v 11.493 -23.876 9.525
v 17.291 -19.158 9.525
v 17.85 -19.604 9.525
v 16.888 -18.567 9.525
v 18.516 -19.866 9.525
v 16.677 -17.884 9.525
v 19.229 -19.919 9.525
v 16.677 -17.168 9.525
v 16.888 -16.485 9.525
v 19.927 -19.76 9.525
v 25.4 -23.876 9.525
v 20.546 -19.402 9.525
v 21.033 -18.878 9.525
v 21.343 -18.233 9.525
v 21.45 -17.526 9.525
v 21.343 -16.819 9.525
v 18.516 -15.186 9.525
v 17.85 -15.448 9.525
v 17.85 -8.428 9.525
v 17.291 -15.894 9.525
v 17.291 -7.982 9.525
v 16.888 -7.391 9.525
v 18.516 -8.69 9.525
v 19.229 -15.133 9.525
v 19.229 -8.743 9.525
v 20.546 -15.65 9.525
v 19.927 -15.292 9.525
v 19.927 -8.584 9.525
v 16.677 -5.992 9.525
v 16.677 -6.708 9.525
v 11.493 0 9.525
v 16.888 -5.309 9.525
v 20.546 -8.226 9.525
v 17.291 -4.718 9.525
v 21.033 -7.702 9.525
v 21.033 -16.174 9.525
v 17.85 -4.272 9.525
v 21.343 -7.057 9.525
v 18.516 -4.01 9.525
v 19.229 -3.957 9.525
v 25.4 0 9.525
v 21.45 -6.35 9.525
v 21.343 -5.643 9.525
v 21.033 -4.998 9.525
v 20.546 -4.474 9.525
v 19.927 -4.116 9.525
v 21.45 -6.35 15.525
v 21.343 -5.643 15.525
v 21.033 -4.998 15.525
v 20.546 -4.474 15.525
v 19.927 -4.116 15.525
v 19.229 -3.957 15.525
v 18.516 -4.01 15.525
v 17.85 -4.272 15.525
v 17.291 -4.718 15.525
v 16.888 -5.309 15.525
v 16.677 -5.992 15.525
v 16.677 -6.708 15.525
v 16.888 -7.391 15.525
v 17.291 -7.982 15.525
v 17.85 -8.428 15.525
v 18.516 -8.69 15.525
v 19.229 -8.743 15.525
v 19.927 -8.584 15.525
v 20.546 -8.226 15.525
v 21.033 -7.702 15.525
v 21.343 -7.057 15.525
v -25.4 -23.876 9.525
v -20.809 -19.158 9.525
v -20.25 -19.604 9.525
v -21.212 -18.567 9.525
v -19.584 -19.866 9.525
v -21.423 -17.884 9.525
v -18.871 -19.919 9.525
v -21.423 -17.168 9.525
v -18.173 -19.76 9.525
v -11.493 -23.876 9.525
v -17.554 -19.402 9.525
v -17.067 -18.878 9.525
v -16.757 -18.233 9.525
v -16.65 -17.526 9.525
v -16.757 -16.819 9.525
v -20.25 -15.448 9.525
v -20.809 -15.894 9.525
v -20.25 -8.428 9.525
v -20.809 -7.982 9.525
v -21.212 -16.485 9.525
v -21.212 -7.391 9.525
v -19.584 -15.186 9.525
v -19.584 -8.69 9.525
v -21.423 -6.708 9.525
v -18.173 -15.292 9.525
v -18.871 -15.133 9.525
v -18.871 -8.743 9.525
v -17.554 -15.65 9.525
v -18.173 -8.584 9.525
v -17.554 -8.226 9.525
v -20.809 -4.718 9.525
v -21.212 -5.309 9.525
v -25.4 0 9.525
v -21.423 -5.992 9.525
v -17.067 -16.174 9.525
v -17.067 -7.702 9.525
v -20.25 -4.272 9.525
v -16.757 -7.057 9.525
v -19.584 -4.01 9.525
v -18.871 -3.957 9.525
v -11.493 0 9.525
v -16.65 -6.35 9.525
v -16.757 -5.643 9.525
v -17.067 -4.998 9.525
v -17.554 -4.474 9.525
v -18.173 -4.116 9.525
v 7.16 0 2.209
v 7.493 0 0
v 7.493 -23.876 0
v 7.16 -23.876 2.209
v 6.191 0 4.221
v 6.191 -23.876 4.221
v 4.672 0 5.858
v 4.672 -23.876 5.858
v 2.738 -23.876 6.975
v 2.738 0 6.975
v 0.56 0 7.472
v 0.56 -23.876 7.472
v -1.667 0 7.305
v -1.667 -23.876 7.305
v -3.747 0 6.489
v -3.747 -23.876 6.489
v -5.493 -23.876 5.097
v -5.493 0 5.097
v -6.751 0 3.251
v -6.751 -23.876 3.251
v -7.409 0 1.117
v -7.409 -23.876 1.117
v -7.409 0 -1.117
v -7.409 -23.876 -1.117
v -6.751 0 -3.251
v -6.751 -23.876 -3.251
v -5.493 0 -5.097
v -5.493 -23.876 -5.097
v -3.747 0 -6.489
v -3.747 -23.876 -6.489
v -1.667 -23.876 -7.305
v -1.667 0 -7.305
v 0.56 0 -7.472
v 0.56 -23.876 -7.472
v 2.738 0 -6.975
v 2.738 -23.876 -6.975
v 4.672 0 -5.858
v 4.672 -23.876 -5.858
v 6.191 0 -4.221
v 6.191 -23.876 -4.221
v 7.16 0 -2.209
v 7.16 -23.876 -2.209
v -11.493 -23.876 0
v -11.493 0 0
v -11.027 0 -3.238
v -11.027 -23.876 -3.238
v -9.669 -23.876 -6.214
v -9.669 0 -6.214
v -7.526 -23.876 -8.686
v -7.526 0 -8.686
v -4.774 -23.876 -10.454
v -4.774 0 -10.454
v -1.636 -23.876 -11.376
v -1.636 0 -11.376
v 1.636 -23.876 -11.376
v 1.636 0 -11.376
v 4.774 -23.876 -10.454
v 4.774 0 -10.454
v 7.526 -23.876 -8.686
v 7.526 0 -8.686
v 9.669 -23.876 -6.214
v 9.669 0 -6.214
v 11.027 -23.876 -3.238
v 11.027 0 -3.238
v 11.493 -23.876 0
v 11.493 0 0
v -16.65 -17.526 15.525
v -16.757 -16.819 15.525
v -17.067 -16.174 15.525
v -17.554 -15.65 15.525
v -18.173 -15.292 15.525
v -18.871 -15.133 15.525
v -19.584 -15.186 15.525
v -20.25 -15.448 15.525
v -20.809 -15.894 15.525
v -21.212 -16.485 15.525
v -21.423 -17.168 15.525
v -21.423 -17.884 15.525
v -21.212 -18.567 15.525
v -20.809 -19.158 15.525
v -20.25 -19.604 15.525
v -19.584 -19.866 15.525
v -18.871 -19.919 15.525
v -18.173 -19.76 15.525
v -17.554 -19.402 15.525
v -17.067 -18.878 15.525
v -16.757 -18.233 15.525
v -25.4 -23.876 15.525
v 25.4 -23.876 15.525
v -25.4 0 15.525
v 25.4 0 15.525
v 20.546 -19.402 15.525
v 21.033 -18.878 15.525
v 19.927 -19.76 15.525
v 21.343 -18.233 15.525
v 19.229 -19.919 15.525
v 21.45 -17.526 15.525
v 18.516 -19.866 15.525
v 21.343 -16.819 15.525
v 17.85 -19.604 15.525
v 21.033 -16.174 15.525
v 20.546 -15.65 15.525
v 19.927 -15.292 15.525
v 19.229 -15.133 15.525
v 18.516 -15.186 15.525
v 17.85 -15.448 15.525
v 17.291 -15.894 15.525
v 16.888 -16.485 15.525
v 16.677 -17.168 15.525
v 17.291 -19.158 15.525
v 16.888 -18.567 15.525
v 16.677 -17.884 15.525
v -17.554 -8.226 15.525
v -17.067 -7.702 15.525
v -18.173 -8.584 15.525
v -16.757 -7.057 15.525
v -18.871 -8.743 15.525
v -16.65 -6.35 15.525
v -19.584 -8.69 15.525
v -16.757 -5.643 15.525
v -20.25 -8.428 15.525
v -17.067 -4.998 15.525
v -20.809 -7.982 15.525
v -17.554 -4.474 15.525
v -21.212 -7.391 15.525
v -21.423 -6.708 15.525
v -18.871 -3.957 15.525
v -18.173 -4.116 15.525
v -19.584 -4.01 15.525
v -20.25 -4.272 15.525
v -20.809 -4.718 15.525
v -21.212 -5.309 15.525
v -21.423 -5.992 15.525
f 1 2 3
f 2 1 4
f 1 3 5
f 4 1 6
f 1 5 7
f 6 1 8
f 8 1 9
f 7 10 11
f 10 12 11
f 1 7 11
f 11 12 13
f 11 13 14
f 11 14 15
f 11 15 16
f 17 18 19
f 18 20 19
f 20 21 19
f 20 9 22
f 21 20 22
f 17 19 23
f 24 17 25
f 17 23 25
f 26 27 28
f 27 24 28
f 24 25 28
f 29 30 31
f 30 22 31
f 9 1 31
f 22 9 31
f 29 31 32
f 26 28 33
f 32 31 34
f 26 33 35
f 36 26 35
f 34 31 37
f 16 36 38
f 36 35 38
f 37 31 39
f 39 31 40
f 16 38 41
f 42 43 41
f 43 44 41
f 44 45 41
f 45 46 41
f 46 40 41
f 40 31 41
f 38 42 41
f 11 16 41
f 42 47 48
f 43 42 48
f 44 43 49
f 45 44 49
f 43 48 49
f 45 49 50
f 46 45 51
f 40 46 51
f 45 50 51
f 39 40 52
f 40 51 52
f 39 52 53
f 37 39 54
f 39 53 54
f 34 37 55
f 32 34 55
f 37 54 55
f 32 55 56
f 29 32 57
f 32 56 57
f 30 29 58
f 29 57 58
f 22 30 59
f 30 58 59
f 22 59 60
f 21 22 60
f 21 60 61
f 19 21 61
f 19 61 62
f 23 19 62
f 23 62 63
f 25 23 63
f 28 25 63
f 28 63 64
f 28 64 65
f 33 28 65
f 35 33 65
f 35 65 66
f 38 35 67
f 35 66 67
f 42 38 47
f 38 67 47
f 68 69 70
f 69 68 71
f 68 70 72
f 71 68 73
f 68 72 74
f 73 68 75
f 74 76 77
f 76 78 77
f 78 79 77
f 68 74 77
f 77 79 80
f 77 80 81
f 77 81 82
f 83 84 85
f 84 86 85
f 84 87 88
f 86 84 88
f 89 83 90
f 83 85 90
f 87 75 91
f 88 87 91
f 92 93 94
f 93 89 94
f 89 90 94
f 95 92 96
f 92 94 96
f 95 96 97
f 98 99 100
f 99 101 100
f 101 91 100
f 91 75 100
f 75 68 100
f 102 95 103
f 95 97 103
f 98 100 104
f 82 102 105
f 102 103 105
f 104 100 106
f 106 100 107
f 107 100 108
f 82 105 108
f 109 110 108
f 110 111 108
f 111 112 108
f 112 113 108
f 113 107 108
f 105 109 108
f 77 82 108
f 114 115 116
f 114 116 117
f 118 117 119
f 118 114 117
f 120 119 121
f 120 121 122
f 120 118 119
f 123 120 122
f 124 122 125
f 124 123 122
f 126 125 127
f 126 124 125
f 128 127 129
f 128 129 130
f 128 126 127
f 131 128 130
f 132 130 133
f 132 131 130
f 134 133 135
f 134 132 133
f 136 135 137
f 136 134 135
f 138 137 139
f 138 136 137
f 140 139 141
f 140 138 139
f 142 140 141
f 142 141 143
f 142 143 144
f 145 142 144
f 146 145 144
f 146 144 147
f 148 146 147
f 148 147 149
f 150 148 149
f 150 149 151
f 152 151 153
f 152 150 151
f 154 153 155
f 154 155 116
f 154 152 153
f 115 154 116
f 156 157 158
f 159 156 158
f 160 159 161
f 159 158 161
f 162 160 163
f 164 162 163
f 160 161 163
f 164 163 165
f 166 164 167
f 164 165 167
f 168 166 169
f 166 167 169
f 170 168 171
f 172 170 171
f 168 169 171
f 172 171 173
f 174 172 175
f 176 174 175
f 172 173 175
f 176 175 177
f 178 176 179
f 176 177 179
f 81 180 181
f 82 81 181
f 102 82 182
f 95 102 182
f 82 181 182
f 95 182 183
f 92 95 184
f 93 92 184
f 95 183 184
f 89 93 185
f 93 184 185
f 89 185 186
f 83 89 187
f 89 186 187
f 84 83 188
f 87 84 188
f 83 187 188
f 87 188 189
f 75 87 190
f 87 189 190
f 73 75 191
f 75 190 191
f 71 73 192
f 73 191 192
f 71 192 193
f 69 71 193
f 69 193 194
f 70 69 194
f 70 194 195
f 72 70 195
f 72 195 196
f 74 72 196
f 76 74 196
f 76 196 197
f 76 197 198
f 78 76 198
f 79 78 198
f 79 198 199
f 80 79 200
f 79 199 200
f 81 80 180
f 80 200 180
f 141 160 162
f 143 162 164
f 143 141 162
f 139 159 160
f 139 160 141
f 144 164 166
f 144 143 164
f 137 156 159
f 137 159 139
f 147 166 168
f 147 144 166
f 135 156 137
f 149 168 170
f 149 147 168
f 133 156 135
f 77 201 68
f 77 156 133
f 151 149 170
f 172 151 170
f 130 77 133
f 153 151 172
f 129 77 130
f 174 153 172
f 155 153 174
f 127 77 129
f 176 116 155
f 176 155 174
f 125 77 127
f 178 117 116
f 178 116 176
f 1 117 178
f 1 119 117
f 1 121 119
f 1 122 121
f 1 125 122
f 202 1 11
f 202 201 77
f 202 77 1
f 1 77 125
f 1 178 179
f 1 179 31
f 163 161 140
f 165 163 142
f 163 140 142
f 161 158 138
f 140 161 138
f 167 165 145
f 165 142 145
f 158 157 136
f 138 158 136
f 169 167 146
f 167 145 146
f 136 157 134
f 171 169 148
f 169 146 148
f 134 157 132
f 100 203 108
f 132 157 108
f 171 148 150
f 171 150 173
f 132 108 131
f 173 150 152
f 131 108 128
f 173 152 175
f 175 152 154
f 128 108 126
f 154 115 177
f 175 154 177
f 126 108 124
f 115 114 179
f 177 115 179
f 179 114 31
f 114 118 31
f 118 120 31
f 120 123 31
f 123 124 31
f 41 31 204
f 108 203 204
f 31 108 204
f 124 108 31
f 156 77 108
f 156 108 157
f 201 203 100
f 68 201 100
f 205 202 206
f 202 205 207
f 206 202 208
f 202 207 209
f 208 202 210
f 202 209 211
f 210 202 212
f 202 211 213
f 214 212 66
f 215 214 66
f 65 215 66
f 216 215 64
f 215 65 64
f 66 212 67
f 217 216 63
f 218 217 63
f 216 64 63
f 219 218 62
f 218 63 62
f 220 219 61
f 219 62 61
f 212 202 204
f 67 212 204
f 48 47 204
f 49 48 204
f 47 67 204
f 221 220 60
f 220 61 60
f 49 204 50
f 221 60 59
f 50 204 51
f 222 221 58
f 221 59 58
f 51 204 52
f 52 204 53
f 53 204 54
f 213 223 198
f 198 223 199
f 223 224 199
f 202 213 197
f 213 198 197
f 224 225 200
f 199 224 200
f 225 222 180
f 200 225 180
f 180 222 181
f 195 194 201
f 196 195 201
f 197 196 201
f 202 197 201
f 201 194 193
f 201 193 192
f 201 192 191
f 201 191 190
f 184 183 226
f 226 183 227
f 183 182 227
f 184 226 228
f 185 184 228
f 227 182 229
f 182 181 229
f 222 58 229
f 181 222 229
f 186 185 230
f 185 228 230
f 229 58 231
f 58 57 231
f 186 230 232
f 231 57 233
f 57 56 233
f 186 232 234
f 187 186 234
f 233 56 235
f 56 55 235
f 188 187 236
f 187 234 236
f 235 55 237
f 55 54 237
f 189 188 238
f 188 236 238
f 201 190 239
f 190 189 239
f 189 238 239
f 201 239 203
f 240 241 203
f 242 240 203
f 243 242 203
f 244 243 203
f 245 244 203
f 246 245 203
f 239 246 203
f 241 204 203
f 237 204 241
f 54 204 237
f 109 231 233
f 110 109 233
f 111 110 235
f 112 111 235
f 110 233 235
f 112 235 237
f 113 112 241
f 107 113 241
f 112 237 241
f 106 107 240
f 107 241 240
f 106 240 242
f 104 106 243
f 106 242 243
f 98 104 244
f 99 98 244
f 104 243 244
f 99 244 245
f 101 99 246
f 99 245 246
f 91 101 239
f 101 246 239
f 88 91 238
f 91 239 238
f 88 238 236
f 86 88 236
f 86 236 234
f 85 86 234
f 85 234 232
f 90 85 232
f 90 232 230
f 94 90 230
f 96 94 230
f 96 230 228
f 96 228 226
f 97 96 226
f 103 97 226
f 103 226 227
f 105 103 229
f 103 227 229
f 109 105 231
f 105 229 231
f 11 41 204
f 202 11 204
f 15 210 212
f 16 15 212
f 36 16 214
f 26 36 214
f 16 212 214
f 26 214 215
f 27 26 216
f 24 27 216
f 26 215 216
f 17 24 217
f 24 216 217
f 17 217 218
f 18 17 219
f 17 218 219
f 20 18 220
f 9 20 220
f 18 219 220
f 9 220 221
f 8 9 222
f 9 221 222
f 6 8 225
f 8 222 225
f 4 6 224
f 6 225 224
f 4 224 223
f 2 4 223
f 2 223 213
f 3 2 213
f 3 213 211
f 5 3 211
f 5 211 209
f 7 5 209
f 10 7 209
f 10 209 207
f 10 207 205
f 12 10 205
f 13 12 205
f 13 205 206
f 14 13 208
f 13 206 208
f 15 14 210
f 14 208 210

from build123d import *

# Parameters (mm, degrees)
F0_R     = 7.493
F1_DEPTH = 23.876
F2_R     = 2.4
F3_DEPTH = 6


with BuildPart() as f1:
    # F0 (on Front) → F1 (new body)
    with BuildSketch(Plane.XZ):
        with BuildLine():
            Line((25.4, 15.525), (-25.4, 15.525))
            Line((-25.4, 15.525), (-25.4, 9.525))
            Line((-25.4, 9.525), (-11.493, 9.525))
            Line((-11.493, 9.525), (-11.493, 0))
            ThreePointArc((-11.493, 0), (0, -11.493), (11.493, 0))
            Line((11.493, 0), (11.493, 9.525))
            Line((11.493, 9.525), (25.4, 9.525))
            Line((25.4, 9.525), (25.4, 15.525))
        make_face()
        Circle(F0_R, mode=Mode.SUBTRACT)
    extrude(amount=F1_DEPTH)

    # F2 (on face) → F3 (cut, through all)
    with BuildSketch(Plane.XY.offset(15.525)):
        with Locations((-19.05, -6.35)):
            Circle(F2_R)
        with Locations((-19.05, -17.526)):
            Circle(F2_R)
        with Locations((19.05, -17.526)):
            Circle(F2_R)
        with Locations((19.05, -6.35)):
            Circle(F2_R)
    extrude(amount=-F3_DEPTH, mode=Mode.SUBTRACT)


solid = f1.part
